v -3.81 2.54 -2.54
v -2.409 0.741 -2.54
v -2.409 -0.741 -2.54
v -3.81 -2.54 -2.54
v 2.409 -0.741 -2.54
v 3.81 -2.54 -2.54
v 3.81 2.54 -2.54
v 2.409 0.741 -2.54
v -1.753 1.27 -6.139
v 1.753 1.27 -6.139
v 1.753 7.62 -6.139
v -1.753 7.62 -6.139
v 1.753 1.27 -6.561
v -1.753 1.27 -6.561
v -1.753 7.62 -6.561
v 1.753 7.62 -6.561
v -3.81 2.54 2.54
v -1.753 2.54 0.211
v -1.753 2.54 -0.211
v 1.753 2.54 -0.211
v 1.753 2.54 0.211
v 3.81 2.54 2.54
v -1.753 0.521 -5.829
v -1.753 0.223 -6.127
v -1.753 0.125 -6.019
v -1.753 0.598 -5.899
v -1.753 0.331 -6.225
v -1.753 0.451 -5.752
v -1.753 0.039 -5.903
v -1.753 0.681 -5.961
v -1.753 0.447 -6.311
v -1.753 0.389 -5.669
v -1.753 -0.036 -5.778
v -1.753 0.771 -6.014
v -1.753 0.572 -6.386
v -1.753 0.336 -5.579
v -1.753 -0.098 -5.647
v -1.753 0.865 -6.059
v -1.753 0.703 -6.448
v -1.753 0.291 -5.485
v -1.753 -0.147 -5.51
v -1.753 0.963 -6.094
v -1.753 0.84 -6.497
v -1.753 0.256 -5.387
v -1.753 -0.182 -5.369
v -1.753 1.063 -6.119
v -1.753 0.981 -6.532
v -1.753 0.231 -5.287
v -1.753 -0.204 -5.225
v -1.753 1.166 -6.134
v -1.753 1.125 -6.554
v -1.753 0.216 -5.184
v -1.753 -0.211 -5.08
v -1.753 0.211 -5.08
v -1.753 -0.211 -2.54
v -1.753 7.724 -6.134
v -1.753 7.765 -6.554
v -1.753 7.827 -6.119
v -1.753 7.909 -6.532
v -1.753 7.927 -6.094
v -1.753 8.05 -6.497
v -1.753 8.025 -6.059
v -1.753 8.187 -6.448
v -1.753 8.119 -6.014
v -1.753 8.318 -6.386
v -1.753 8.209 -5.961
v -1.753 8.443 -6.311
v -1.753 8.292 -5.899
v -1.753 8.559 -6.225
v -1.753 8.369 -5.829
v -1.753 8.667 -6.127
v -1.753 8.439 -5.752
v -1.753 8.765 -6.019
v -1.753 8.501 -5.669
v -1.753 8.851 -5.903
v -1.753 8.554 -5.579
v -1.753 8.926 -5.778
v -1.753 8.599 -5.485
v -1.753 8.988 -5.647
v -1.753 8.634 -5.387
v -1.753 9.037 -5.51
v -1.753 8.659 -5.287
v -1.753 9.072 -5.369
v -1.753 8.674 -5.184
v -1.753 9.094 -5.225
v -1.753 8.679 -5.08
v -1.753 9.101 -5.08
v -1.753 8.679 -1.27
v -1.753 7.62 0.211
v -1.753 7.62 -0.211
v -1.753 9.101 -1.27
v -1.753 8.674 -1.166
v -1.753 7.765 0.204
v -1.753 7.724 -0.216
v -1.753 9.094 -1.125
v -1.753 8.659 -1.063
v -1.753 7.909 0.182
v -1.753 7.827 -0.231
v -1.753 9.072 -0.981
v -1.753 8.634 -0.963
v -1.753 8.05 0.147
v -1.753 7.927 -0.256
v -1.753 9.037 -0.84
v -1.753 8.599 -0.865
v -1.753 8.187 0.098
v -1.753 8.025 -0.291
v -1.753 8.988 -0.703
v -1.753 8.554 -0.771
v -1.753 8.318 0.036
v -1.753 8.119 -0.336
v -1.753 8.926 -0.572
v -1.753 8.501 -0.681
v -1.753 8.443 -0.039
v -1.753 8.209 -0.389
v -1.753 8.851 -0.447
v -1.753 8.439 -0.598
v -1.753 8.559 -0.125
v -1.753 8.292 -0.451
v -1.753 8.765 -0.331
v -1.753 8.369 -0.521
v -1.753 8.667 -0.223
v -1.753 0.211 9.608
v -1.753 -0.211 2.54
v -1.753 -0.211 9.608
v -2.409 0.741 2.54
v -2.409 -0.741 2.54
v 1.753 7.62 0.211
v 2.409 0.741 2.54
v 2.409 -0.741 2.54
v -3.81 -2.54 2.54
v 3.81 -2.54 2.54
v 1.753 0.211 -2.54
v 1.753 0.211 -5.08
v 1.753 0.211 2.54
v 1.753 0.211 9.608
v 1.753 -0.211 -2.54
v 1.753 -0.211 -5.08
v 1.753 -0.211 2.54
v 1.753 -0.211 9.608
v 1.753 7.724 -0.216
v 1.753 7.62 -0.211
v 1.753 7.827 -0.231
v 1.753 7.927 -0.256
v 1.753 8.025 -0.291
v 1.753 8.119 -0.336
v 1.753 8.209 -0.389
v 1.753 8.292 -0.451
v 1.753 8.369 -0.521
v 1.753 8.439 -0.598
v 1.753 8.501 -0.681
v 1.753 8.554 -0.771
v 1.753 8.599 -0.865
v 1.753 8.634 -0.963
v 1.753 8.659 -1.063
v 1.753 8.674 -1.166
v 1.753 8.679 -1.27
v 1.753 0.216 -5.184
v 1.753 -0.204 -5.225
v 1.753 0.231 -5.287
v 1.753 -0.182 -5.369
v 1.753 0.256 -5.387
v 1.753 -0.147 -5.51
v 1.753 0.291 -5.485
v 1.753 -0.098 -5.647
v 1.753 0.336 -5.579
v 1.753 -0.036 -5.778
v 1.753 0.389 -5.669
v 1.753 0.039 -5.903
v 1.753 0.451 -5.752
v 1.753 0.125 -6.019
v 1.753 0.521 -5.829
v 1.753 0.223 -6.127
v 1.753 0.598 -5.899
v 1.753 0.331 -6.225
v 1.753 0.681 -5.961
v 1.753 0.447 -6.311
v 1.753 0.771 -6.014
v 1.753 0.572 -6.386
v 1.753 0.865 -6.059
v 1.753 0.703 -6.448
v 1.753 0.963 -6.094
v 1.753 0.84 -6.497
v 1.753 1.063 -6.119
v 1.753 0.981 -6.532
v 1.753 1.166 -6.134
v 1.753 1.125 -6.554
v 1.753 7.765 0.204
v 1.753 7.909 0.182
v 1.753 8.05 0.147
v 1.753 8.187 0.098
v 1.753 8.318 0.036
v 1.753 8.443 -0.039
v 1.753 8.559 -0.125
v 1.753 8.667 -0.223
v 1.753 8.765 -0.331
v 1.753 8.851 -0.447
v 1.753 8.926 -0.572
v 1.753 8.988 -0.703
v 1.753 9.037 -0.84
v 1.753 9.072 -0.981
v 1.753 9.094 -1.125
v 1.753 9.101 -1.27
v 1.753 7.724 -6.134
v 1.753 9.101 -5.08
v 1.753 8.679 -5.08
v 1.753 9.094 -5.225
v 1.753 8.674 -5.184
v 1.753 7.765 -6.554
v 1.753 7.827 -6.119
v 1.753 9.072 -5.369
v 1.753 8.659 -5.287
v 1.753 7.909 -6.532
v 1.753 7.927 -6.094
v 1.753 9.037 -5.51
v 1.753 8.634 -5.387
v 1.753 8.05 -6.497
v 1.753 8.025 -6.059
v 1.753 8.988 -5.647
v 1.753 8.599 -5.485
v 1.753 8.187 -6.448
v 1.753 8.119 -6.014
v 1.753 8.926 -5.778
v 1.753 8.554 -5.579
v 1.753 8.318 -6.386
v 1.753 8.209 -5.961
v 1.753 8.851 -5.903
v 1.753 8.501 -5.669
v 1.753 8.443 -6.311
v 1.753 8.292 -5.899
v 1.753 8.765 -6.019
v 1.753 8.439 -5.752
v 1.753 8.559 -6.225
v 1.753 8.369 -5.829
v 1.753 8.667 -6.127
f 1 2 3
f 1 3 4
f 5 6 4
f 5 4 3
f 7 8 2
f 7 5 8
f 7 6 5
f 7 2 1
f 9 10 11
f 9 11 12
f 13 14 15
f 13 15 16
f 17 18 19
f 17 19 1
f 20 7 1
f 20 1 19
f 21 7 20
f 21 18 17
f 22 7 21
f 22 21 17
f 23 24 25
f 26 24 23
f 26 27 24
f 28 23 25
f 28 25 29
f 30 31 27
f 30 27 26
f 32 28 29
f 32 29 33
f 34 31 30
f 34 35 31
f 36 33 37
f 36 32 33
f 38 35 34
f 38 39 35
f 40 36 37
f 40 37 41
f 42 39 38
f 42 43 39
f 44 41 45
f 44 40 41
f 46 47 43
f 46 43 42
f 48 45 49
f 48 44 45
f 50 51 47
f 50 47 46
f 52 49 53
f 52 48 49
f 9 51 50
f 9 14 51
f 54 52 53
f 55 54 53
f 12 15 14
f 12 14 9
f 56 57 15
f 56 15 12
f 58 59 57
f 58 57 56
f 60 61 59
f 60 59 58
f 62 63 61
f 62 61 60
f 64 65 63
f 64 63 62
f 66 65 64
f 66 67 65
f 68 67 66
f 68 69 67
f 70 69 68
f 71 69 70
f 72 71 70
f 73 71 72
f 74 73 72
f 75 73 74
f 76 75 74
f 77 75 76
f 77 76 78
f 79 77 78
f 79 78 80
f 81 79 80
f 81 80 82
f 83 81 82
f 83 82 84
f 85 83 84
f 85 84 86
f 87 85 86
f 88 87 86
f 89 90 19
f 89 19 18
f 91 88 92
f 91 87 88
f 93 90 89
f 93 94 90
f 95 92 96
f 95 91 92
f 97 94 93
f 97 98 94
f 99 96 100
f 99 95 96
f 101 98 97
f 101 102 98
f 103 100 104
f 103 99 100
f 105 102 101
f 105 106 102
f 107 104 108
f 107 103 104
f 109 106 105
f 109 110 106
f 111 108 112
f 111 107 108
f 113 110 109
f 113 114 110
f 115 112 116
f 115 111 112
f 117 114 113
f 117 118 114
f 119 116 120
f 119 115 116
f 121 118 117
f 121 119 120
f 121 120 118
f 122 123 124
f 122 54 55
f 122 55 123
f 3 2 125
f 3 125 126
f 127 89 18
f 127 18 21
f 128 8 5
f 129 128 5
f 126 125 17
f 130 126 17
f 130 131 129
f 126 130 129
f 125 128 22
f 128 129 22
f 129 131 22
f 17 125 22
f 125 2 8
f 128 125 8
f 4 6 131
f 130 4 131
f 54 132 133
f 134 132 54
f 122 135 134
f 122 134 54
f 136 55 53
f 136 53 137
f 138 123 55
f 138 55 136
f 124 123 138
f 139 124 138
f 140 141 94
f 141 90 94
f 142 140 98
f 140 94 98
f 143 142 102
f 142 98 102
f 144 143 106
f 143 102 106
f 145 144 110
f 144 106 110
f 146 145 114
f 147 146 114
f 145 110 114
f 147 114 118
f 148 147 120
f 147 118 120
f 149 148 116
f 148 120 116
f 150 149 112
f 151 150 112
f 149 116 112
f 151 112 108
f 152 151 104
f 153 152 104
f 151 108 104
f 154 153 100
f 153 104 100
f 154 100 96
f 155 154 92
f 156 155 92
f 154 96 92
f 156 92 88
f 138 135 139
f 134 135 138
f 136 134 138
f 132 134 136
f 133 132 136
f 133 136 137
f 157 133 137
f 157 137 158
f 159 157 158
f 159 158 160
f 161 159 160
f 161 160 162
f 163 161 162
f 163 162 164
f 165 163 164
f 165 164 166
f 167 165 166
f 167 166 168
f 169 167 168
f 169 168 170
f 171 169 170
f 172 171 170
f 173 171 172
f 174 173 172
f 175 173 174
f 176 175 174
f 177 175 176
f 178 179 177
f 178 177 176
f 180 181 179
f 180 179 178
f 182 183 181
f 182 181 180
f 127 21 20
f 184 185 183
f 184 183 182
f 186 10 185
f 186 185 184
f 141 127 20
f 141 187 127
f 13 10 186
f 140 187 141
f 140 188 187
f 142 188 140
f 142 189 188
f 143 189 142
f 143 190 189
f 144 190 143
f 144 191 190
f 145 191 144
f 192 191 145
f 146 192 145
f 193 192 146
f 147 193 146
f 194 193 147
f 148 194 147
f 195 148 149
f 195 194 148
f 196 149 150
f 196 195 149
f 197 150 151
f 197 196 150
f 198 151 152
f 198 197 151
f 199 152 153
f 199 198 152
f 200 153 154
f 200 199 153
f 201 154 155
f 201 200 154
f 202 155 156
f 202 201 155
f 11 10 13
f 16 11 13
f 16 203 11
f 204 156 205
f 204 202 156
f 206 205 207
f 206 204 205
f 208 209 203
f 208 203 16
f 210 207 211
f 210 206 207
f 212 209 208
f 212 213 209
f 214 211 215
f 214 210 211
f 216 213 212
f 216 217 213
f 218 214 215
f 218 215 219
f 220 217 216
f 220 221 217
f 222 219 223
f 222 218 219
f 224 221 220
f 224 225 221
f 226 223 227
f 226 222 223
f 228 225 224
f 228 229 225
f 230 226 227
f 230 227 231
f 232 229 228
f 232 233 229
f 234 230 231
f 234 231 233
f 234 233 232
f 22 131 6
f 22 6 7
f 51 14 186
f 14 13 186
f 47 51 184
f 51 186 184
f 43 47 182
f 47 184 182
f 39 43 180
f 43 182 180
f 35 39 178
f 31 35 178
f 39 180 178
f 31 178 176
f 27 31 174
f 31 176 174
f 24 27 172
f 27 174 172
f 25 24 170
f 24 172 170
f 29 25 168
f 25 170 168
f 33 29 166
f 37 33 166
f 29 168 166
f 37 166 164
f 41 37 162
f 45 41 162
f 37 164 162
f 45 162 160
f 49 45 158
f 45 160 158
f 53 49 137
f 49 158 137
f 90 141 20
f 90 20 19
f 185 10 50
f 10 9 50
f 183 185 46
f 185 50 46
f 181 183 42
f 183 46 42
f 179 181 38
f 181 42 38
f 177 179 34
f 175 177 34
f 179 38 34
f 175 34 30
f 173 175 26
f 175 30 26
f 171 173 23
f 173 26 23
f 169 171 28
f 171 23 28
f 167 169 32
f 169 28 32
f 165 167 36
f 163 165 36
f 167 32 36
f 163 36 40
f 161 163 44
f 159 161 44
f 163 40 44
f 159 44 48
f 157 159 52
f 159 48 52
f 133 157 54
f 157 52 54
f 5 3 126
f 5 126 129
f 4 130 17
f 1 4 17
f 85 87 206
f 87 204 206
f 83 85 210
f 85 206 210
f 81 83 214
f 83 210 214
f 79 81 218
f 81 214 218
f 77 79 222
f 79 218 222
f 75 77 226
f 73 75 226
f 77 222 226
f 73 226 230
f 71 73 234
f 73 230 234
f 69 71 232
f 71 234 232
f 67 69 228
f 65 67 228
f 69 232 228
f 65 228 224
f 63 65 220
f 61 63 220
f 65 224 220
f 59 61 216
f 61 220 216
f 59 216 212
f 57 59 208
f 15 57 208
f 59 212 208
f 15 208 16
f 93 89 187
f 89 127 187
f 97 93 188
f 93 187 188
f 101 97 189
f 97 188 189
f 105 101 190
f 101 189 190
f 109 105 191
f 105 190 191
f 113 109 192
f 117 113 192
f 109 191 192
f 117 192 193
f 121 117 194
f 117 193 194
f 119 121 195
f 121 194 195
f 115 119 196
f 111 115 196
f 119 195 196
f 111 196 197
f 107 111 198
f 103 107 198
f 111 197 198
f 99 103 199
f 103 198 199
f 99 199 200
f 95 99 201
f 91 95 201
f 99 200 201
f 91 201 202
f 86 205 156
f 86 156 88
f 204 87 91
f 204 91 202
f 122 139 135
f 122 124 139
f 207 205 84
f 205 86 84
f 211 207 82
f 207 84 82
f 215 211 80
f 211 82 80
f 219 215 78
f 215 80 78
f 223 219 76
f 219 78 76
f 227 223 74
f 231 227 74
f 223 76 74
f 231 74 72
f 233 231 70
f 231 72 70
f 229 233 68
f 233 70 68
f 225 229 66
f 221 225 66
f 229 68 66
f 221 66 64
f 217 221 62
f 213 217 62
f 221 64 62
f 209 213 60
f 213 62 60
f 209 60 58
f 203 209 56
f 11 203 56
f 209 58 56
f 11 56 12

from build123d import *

# Parameters (mm, degrees)
F0_W     = 5.08
F0_H     = 5.08
F1_DEPTH = 3.81
F3_W     = 3.506887937
F3_H     = 0.4214280925
F5_W     = 4.8186806962
F5_H     = 1.4827313134
F5_W_2   = 3.506887937
F5_H_2   = 0.4214280925
F6_DEPTH = 5.08


with BuildPart() as f1:
    # F0 (on Right) → F1 (new body, symmetric)
    with BuildSketch(Plane.YZ):
        Rectangle(F0_W, F0_H)
    extrude(amount=F1_DEPTH, both=True)

    # F4: sweep along a path in F2
    with BuildLine(Plane.YZ) as f4_path:
        Line((2.54, 0), (7.62, 0))
        ThreePointArc((7.62, 0), (8.5180256121, -0.3719743879), (8.89, -1.27))
        Line((8.89, -1.27), (8.89, -5.08))
        ThreePointArc((8.89, -5.08), (8.5180256121, -5.9780256121), (7.62, -6.35))
        Line((7.62, -6.35), (1.27, -6.35))
        ThreePointArc((1.27, -6.35), (0.3719743879, -5.9780256121), (0, -5.08))
        Line((0, -5.08), (0, 9.6079269424))
    # F3 (on face) → F4 (sweep)
    with BuildSketch(Plane(origin=(0, 2.54, 0), x_dir=(-1, 0, 0), z_dir=(0, 1, 0))):
        Rectangle(F3_W, F3_H)
    sweep(path=f4_path.line)

    # F5 (on face) → F6 (cut, through all)
    with BuildSketch(Plane(origin=(0, 0, -2.54), x_dir=(1, 0, 0), z_dir=(0, 0, -1))):
        Rectangle(F5_W, F5_H)
        Rectangle(F5_W_2, F5_H_2, mode=Mode.SUBTRACT)
    extrude(amount=-F6_DEPTH, mode=Mode.SUBTRACT)


solid = f1.part
